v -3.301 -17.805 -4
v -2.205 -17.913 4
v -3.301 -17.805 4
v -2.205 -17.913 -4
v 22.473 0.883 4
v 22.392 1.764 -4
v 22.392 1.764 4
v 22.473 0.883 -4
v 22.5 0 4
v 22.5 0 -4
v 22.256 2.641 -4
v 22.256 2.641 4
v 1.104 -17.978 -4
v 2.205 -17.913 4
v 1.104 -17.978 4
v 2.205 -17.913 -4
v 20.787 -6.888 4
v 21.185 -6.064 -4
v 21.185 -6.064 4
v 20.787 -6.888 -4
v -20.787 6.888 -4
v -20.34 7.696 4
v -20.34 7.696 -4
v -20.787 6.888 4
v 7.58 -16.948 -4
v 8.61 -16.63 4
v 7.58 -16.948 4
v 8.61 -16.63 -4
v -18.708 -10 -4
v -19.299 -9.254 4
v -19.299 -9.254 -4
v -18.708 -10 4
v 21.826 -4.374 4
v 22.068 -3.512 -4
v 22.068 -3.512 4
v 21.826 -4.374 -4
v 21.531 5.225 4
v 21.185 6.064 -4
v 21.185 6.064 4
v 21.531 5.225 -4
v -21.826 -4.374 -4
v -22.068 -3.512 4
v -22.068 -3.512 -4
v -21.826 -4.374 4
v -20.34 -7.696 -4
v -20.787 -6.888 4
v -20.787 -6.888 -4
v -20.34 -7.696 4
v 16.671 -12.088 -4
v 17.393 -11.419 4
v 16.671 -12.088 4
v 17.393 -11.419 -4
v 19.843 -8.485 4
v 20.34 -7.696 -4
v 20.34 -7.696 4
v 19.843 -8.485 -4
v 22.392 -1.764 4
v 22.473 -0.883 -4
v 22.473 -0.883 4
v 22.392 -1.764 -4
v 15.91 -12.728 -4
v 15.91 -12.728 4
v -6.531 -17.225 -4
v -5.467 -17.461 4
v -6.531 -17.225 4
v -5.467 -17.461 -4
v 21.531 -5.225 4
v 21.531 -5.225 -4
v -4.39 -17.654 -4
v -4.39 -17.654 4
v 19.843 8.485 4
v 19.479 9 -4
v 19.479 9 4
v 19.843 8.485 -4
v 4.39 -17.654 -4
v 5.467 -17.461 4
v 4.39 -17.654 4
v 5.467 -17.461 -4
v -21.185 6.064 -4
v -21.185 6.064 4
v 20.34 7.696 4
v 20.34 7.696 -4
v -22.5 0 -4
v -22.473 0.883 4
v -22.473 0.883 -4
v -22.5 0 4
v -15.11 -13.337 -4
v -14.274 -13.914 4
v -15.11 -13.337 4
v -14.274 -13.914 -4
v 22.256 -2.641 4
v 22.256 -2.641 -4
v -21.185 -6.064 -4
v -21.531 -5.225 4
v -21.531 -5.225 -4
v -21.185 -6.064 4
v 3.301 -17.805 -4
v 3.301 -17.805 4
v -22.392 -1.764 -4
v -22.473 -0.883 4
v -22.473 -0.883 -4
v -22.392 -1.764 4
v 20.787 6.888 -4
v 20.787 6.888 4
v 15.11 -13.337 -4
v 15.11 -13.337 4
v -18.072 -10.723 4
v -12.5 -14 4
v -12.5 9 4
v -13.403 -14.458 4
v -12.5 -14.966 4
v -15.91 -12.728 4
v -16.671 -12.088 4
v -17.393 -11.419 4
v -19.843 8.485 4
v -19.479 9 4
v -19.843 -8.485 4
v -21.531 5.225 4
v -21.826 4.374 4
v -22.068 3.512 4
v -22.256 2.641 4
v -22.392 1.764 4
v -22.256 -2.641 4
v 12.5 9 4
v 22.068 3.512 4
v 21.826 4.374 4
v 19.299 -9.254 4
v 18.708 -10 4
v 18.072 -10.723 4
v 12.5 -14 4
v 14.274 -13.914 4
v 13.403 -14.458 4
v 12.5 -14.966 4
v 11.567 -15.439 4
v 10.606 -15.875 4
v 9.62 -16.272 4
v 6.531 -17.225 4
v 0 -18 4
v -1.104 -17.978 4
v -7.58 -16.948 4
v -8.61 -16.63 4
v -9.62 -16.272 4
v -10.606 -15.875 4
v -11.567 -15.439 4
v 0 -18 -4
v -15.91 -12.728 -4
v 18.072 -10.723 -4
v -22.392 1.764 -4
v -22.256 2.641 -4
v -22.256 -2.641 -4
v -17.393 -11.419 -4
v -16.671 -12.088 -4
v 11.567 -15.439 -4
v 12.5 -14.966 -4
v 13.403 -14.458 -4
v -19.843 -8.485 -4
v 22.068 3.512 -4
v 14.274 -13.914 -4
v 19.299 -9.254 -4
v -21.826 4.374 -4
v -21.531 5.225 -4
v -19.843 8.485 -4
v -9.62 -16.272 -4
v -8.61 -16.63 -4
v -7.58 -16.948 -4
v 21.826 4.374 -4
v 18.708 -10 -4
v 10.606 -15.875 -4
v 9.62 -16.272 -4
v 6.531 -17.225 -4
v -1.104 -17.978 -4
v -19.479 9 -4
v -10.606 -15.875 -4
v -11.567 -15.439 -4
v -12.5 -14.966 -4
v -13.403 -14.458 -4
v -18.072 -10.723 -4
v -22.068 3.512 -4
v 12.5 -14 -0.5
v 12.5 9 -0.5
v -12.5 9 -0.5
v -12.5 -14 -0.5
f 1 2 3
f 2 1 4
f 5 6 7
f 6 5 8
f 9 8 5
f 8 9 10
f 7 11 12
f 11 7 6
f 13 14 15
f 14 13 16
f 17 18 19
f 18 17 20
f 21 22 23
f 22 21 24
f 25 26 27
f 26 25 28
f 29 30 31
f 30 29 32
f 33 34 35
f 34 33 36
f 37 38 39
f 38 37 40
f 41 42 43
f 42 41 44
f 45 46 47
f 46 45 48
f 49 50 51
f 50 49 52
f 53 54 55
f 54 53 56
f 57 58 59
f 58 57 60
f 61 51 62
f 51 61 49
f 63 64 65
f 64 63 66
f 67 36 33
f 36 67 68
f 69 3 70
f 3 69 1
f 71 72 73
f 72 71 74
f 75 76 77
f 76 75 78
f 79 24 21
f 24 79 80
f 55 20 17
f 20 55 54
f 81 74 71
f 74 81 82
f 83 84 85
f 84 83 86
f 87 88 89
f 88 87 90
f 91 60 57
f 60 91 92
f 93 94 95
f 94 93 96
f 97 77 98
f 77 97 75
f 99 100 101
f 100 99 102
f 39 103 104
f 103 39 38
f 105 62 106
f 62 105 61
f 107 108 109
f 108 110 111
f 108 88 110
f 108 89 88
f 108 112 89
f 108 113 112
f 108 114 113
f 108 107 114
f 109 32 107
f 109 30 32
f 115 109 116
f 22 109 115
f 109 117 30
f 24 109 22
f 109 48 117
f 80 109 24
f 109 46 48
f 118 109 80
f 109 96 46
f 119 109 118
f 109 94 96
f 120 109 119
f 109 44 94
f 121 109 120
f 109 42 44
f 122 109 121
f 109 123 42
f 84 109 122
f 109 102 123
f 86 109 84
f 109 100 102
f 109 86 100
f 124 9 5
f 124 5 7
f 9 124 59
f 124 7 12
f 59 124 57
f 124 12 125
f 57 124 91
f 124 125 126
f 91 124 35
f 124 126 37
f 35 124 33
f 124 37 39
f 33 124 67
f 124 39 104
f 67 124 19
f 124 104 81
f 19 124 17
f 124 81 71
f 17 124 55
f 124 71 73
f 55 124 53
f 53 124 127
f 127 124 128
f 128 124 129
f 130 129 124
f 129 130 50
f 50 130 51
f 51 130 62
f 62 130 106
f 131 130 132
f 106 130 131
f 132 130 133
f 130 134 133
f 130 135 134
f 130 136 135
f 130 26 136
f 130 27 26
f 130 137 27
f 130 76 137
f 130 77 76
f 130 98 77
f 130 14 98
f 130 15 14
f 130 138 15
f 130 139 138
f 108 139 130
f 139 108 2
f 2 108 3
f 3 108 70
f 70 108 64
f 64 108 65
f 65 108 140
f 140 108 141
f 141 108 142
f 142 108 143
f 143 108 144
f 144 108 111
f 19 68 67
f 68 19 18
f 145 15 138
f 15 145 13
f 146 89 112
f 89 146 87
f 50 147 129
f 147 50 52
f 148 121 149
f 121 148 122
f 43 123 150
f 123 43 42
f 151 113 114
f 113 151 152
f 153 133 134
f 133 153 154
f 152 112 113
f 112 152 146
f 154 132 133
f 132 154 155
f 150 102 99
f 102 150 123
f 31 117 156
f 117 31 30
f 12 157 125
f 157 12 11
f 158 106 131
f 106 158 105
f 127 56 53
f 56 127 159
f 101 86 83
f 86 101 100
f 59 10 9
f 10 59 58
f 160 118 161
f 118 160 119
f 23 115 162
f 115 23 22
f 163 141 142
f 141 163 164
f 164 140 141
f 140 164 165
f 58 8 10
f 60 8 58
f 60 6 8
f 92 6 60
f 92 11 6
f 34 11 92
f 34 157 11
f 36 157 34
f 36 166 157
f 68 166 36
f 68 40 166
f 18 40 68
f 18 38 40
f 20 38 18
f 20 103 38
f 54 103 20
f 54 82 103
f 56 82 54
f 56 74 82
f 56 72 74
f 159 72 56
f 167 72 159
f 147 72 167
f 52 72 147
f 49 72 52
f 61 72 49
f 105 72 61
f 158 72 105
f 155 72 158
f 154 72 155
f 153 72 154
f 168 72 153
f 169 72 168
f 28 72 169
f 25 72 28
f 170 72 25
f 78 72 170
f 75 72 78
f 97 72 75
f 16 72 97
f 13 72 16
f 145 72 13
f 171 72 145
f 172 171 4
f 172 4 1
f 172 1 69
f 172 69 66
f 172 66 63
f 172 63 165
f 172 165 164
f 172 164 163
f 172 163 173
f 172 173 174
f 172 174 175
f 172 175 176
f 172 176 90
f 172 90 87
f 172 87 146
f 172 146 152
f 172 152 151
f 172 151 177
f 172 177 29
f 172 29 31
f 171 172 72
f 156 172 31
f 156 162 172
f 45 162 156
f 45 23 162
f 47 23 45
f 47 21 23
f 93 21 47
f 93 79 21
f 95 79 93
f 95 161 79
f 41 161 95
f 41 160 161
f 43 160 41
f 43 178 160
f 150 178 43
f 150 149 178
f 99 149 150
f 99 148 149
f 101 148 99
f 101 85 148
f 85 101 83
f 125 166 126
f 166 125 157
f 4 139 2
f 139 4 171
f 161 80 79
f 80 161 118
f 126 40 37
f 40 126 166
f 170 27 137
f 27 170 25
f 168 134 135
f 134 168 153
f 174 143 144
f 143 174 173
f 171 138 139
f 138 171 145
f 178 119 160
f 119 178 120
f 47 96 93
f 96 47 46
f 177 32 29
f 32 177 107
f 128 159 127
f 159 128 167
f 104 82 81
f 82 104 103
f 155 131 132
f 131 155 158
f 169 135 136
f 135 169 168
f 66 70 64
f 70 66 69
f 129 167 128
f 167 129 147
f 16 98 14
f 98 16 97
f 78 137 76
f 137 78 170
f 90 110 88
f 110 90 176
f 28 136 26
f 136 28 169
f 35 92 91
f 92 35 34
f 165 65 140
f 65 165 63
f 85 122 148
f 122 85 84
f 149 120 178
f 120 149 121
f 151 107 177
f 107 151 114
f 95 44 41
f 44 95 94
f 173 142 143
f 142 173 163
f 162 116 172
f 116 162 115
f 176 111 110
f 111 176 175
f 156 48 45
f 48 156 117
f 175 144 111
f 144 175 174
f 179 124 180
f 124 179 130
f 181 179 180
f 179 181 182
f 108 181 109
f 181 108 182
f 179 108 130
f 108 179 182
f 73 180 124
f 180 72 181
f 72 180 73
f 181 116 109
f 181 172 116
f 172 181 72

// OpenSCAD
fudge = 1;
$fn = 128;

difference() {
	scale([1, 4/5, 1])
		cylinder(d=45,h=8, center=true); 
	translate([0,-2.5+fudge/2,2])
		cube([25,23+fudge,4+fudge],center=true);
	translate([0,45/2+9,0])
		cube([45,45,45],center=true);		
}
